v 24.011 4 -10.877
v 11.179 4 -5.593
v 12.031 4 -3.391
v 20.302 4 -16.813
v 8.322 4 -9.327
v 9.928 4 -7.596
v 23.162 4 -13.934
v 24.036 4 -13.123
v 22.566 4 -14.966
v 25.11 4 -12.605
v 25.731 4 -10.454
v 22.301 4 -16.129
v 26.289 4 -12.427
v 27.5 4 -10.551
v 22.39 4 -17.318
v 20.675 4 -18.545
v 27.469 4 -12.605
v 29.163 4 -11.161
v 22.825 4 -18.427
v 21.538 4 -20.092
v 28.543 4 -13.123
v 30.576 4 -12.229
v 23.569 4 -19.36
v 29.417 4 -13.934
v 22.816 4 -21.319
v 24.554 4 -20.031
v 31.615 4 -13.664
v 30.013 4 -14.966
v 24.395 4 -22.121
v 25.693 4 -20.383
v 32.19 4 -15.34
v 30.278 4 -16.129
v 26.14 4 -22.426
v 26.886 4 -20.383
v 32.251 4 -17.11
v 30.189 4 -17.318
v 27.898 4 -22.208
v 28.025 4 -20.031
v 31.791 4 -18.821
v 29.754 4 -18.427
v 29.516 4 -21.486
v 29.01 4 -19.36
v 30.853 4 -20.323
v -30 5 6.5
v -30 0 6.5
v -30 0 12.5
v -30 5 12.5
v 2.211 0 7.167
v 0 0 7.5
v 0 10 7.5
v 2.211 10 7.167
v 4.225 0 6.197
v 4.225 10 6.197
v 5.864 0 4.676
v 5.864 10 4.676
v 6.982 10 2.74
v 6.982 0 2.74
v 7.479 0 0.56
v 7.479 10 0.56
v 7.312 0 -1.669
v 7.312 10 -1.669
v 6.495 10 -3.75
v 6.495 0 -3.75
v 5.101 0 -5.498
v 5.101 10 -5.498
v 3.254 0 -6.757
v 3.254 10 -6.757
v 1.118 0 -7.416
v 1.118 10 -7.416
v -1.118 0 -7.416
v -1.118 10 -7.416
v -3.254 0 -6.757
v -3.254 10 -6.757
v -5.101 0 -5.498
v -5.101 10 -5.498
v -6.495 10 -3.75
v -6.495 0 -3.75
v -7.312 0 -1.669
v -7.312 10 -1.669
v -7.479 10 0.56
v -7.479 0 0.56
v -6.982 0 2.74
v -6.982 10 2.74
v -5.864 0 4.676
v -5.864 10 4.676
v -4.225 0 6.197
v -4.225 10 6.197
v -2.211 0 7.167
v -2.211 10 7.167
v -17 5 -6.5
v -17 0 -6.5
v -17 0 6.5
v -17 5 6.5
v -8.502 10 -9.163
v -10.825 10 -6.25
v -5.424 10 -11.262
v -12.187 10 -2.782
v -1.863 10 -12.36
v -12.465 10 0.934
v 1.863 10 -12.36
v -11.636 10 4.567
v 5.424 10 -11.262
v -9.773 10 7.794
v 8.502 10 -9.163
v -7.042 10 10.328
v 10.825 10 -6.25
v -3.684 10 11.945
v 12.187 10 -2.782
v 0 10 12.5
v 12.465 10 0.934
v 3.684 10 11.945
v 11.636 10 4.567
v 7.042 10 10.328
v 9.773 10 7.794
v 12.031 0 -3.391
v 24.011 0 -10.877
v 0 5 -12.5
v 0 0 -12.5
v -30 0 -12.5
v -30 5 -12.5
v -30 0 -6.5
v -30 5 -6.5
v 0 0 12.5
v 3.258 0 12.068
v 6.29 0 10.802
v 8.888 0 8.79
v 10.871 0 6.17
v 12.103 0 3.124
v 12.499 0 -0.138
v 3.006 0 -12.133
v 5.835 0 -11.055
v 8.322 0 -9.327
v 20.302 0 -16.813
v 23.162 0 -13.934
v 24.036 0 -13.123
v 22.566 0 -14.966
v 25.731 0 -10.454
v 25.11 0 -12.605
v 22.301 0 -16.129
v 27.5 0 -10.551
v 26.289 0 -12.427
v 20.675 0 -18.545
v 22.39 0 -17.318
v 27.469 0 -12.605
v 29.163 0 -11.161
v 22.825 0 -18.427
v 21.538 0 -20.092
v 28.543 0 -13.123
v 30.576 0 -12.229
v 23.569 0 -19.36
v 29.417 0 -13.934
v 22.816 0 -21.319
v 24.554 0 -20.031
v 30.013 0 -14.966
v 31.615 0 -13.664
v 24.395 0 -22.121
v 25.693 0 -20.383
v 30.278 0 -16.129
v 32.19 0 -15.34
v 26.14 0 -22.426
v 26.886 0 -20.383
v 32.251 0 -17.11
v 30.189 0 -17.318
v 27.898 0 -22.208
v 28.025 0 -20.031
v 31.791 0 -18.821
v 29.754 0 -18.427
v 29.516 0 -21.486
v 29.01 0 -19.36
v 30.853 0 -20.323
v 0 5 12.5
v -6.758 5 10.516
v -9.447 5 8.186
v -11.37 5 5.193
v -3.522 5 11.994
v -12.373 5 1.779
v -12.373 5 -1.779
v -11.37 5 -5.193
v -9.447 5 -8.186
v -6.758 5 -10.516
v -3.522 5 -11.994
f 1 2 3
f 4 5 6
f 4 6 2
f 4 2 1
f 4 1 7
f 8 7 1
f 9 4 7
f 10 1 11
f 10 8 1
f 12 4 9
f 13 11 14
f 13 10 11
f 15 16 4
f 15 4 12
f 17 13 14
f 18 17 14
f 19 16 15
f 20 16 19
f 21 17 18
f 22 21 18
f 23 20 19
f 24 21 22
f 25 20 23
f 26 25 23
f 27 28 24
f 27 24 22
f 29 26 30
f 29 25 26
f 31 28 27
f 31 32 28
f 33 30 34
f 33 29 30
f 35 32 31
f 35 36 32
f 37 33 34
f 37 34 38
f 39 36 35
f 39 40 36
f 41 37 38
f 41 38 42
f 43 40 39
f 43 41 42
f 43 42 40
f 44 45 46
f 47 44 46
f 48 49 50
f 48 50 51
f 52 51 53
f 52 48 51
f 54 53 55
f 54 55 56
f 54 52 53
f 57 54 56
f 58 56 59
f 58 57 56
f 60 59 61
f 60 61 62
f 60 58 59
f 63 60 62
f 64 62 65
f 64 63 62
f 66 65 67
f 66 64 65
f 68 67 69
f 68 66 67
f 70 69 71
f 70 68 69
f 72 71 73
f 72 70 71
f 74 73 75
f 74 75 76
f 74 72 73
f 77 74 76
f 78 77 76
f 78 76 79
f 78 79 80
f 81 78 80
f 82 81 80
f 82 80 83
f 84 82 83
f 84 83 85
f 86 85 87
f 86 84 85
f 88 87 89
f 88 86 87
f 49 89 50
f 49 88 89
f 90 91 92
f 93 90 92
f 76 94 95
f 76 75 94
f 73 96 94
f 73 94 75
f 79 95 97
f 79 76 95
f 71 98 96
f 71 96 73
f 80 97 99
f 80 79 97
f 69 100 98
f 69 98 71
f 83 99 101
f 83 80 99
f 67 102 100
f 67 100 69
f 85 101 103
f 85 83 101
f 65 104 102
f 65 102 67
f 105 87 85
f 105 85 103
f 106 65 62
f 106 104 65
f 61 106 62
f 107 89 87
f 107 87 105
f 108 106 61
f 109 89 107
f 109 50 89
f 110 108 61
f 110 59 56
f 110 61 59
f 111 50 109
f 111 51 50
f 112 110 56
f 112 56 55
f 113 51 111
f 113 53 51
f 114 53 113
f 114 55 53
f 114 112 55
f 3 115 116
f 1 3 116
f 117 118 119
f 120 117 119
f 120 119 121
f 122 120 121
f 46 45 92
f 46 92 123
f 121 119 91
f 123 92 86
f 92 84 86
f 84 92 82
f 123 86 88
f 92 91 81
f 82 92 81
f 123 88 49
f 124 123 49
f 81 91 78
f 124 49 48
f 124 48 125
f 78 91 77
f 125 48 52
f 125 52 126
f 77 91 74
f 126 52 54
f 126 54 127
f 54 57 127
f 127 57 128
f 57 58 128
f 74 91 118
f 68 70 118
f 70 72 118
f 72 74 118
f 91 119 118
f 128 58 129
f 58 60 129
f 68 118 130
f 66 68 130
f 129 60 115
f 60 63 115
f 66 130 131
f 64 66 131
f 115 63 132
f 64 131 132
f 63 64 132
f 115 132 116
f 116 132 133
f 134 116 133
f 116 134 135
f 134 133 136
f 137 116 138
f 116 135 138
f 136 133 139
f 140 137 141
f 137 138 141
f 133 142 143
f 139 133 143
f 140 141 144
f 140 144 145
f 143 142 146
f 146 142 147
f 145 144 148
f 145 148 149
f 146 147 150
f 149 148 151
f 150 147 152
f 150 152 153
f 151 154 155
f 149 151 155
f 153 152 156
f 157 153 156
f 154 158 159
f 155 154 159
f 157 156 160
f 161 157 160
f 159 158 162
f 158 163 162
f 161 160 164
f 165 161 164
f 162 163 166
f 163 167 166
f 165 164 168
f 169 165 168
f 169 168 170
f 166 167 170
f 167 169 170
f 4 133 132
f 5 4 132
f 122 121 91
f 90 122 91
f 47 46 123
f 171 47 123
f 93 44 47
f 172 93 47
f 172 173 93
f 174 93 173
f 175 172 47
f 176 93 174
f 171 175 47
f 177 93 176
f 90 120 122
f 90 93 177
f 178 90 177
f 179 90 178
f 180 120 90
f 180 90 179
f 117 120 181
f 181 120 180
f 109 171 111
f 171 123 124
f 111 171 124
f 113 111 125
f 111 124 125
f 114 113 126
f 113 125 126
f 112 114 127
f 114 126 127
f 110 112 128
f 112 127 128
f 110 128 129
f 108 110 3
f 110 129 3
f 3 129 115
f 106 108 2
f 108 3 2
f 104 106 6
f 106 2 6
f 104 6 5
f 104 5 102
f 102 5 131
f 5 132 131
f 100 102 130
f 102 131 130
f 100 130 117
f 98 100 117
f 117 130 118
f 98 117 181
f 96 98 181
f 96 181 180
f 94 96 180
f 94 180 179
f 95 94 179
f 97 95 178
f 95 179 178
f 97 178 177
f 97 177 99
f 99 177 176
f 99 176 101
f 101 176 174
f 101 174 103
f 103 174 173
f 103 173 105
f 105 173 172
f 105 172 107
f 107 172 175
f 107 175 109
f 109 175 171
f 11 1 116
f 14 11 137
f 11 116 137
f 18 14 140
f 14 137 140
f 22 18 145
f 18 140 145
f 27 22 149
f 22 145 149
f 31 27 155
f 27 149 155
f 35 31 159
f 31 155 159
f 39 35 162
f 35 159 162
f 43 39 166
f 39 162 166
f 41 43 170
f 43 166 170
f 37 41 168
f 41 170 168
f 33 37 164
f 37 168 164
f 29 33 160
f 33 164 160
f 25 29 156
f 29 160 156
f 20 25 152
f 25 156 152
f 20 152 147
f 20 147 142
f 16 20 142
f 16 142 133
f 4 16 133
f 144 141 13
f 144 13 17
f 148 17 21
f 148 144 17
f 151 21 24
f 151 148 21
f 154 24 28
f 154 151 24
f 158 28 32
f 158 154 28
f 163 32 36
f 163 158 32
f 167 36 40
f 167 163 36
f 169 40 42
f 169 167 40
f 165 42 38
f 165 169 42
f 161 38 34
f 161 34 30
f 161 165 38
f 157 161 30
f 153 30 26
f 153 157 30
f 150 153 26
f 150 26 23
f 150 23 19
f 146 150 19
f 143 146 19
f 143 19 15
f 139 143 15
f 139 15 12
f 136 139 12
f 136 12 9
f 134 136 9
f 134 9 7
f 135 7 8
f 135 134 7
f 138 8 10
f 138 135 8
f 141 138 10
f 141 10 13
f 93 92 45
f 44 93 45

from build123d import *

# Parameters (mm, degrees)
SKETCH_1_R      = 7.5
EXTRUDE_1_DEPTH = 10
EXTRUDE_3_DEPTH = 5
SKETCH_1_5_R    = 4
EXTRUDE_4_DEPTH = 4


with BuildPart() as part:
    # 草图1 → 凸台-拉伸1 (new body)
    with BuildSketch(Plane(origin=(0, 0, 0), x_dir=(1, 0, 0), z_dir=(0, 1, 0))):
        with BuildLine():
            ThreePointArc((12.031294579, 3.390862834), (10.600601202, 6.623990803), (8.321859729, 9.327199507))
            ThreePointArc((8.321859729, 9.327199507), (4.453089161, 11.679897128), (0, 12.5))
            ThreePointArc((0, 12.5), (-12.5, 0), (0, -12.5))
            ThreePointArc((0, -12.5), (8.838834765, -8.838834765), (12.5, 0))
            ThreePointArc((12.5, 0), (12.382269223, 1.711551601), (12.031294579, 3.390862834))
        make_face()
        Circle(SKETCH_1_R, mode=Mode.SUBTRACT)
    extrude(amount=EXTRUDE_1_DEPTH)

    # 草图1<4> → 凸台-拉伸3 (add)
    with BuildSketch(Plane(origin=(0, 0, 0), x_dir=(1, 0, 0), z_dir=(0, 1, 0))):
        with BuildLine():
            ThreePointArc((0, -12.5), (-12.5, 0), (0, 12.5))
            Line((0, 12.5), (-30, 12.5))
            Line((-30, 12.5), (-30, 6.5))
            Line((-30, 6.5), (-17, 6.5))
            Line((-17, 6.5), (-17, -6.5))
            Line((-17, -6.5), (-30, -6.5))
            Line((-30, -6.5), (-30, -12.5))
            Line((-30, -12.5), (0, -12.5))
        make_face()
    extrude(amount=EXTRUDE_3_DEPTH)

    # 草图1<5> → 凸台-拉伸4 (add)
    with BuildSketch(Plane(origin=(0, 0, 0), x_dir=(1, 0, 0), z_dir=(0, 1, 0))):
        with BuildLine():
            Line((20.301898362, 16.813158484), (8.321859729, 9.327199507))
            ThreePointArc((8.321859729, 9.327199507), (10.600601202, 6.623990803), (12.031294579, 3.390862834))
            Line((12.031294579, 3.390862834), (24.011333212, 10.876821811))
            ThreePointArc((24.011333212, 10.876821811), (31.377779558, 19.607012777), (20.301898362, 16.813158484))
        make_face()
        with Locations((26.289490981, 16.427497191)):
            Circle(SKETCH_1_5_R, mode=Mode.SUBTRACT)
    extrude(amount=EXTRUDE_4_DEPTH)


solid = part.part
